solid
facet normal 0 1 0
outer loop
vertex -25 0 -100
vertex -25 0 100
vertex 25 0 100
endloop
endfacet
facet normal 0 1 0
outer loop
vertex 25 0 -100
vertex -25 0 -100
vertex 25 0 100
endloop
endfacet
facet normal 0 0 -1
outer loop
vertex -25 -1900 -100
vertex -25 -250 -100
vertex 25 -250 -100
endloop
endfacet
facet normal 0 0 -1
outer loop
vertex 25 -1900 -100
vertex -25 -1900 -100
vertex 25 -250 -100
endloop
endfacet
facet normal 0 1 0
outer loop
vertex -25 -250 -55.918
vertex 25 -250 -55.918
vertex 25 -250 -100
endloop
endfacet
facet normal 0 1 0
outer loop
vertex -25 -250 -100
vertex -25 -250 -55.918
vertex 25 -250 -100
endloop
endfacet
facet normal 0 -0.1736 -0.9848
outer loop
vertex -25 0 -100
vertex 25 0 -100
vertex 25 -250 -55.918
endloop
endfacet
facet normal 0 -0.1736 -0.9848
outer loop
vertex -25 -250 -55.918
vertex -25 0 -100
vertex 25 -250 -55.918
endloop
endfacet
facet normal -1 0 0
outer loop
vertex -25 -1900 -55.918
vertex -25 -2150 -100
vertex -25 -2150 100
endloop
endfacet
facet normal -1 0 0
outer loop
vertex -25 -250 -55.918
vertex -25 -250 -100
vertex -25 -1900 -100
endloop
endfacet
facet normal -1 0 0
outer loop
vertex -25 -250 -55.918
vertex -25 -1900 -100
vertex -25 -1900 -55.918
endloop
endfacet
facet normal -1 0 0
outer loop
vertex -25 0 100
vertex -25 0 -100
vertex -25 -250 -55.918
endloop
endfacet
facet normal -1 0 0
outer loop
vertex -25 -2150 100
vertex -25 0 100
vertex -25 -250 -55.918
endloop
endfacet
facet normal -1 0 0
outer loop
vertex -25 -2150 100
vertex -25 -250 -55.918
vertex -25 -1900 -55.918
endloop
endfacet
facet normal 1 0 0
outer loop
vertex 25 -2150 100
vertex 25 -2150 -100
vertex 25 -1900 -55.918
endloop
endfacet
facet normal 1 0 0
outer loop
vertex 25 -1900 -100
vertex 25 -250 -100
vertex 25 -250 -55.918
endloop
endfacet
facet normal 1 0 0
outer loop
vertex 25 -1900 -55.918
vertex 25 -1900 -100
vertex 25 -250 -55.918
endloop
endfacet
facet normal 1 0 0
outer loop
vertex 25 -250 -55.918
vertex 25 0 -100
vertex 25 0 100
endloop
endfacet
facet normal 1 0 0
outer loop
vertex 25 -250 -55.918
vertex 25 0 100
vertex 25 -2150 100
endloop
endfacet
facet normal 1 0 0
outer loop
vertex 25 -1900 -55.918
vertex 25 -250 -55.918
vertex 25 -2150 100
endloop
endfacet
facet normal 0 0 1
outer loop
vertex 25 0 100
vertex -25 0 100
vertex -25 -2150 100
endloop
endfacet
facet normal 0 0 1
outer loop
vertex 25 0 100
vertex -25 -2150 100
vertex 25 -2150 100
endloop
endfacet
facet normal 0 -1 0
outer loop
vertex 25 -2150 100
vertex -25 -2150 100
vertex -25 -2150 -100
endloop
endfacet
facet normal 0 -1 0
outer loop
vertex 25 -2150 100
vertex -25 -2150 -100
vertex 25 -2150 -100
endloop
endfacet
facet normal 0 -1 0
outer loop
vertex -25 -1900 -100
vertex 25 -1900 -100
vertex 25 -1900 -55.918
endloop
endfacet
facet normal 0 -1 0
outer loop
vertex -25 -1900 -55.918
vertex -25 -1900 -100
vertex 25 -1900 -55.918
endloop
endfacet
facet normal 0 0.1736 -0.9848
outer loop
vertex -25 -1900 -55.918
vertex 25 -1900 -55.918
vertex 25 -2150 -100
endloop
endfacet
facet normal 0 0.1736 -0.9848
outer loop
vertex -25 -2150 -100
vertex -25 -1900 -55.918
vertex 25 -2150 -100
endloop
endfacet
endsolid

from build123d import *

# Parameters (mm, degrees)
F0_W     = 50
F0_H     = 200
F1_DEPTH = 2150
F4_DEPTH = 50
F6_DEPTH = 50


with BuildPart() as f1:
    # F0 (on Front) → F1 (new body)
    with BuildSketch(Plane.XZ):
        Rectangle(F0_W, F0_H)
    extrude(amount=F1_DEPTH)

    # F3 (on face) → F4 (cut)
    with BuildSketch(Plane.YZ.offset(25)):
        Polygon((-1900, -100), (-1900, -55.918255), (-2150, -100), align=None)
    extrude(amount=-F4_DEPTH, mode=Mode.SUBTRACT)

    # F5 (on face) → F6 (cut)
    with BuildSketch(Plane.YZ.offset(25)):
        Polygon((-250, -55.918255), (-250, -100), (0, -100), align=None)
    extrude(amount=-F6_DEPTH, mode=Mode.SUBTRACT)


solid = f1.part
